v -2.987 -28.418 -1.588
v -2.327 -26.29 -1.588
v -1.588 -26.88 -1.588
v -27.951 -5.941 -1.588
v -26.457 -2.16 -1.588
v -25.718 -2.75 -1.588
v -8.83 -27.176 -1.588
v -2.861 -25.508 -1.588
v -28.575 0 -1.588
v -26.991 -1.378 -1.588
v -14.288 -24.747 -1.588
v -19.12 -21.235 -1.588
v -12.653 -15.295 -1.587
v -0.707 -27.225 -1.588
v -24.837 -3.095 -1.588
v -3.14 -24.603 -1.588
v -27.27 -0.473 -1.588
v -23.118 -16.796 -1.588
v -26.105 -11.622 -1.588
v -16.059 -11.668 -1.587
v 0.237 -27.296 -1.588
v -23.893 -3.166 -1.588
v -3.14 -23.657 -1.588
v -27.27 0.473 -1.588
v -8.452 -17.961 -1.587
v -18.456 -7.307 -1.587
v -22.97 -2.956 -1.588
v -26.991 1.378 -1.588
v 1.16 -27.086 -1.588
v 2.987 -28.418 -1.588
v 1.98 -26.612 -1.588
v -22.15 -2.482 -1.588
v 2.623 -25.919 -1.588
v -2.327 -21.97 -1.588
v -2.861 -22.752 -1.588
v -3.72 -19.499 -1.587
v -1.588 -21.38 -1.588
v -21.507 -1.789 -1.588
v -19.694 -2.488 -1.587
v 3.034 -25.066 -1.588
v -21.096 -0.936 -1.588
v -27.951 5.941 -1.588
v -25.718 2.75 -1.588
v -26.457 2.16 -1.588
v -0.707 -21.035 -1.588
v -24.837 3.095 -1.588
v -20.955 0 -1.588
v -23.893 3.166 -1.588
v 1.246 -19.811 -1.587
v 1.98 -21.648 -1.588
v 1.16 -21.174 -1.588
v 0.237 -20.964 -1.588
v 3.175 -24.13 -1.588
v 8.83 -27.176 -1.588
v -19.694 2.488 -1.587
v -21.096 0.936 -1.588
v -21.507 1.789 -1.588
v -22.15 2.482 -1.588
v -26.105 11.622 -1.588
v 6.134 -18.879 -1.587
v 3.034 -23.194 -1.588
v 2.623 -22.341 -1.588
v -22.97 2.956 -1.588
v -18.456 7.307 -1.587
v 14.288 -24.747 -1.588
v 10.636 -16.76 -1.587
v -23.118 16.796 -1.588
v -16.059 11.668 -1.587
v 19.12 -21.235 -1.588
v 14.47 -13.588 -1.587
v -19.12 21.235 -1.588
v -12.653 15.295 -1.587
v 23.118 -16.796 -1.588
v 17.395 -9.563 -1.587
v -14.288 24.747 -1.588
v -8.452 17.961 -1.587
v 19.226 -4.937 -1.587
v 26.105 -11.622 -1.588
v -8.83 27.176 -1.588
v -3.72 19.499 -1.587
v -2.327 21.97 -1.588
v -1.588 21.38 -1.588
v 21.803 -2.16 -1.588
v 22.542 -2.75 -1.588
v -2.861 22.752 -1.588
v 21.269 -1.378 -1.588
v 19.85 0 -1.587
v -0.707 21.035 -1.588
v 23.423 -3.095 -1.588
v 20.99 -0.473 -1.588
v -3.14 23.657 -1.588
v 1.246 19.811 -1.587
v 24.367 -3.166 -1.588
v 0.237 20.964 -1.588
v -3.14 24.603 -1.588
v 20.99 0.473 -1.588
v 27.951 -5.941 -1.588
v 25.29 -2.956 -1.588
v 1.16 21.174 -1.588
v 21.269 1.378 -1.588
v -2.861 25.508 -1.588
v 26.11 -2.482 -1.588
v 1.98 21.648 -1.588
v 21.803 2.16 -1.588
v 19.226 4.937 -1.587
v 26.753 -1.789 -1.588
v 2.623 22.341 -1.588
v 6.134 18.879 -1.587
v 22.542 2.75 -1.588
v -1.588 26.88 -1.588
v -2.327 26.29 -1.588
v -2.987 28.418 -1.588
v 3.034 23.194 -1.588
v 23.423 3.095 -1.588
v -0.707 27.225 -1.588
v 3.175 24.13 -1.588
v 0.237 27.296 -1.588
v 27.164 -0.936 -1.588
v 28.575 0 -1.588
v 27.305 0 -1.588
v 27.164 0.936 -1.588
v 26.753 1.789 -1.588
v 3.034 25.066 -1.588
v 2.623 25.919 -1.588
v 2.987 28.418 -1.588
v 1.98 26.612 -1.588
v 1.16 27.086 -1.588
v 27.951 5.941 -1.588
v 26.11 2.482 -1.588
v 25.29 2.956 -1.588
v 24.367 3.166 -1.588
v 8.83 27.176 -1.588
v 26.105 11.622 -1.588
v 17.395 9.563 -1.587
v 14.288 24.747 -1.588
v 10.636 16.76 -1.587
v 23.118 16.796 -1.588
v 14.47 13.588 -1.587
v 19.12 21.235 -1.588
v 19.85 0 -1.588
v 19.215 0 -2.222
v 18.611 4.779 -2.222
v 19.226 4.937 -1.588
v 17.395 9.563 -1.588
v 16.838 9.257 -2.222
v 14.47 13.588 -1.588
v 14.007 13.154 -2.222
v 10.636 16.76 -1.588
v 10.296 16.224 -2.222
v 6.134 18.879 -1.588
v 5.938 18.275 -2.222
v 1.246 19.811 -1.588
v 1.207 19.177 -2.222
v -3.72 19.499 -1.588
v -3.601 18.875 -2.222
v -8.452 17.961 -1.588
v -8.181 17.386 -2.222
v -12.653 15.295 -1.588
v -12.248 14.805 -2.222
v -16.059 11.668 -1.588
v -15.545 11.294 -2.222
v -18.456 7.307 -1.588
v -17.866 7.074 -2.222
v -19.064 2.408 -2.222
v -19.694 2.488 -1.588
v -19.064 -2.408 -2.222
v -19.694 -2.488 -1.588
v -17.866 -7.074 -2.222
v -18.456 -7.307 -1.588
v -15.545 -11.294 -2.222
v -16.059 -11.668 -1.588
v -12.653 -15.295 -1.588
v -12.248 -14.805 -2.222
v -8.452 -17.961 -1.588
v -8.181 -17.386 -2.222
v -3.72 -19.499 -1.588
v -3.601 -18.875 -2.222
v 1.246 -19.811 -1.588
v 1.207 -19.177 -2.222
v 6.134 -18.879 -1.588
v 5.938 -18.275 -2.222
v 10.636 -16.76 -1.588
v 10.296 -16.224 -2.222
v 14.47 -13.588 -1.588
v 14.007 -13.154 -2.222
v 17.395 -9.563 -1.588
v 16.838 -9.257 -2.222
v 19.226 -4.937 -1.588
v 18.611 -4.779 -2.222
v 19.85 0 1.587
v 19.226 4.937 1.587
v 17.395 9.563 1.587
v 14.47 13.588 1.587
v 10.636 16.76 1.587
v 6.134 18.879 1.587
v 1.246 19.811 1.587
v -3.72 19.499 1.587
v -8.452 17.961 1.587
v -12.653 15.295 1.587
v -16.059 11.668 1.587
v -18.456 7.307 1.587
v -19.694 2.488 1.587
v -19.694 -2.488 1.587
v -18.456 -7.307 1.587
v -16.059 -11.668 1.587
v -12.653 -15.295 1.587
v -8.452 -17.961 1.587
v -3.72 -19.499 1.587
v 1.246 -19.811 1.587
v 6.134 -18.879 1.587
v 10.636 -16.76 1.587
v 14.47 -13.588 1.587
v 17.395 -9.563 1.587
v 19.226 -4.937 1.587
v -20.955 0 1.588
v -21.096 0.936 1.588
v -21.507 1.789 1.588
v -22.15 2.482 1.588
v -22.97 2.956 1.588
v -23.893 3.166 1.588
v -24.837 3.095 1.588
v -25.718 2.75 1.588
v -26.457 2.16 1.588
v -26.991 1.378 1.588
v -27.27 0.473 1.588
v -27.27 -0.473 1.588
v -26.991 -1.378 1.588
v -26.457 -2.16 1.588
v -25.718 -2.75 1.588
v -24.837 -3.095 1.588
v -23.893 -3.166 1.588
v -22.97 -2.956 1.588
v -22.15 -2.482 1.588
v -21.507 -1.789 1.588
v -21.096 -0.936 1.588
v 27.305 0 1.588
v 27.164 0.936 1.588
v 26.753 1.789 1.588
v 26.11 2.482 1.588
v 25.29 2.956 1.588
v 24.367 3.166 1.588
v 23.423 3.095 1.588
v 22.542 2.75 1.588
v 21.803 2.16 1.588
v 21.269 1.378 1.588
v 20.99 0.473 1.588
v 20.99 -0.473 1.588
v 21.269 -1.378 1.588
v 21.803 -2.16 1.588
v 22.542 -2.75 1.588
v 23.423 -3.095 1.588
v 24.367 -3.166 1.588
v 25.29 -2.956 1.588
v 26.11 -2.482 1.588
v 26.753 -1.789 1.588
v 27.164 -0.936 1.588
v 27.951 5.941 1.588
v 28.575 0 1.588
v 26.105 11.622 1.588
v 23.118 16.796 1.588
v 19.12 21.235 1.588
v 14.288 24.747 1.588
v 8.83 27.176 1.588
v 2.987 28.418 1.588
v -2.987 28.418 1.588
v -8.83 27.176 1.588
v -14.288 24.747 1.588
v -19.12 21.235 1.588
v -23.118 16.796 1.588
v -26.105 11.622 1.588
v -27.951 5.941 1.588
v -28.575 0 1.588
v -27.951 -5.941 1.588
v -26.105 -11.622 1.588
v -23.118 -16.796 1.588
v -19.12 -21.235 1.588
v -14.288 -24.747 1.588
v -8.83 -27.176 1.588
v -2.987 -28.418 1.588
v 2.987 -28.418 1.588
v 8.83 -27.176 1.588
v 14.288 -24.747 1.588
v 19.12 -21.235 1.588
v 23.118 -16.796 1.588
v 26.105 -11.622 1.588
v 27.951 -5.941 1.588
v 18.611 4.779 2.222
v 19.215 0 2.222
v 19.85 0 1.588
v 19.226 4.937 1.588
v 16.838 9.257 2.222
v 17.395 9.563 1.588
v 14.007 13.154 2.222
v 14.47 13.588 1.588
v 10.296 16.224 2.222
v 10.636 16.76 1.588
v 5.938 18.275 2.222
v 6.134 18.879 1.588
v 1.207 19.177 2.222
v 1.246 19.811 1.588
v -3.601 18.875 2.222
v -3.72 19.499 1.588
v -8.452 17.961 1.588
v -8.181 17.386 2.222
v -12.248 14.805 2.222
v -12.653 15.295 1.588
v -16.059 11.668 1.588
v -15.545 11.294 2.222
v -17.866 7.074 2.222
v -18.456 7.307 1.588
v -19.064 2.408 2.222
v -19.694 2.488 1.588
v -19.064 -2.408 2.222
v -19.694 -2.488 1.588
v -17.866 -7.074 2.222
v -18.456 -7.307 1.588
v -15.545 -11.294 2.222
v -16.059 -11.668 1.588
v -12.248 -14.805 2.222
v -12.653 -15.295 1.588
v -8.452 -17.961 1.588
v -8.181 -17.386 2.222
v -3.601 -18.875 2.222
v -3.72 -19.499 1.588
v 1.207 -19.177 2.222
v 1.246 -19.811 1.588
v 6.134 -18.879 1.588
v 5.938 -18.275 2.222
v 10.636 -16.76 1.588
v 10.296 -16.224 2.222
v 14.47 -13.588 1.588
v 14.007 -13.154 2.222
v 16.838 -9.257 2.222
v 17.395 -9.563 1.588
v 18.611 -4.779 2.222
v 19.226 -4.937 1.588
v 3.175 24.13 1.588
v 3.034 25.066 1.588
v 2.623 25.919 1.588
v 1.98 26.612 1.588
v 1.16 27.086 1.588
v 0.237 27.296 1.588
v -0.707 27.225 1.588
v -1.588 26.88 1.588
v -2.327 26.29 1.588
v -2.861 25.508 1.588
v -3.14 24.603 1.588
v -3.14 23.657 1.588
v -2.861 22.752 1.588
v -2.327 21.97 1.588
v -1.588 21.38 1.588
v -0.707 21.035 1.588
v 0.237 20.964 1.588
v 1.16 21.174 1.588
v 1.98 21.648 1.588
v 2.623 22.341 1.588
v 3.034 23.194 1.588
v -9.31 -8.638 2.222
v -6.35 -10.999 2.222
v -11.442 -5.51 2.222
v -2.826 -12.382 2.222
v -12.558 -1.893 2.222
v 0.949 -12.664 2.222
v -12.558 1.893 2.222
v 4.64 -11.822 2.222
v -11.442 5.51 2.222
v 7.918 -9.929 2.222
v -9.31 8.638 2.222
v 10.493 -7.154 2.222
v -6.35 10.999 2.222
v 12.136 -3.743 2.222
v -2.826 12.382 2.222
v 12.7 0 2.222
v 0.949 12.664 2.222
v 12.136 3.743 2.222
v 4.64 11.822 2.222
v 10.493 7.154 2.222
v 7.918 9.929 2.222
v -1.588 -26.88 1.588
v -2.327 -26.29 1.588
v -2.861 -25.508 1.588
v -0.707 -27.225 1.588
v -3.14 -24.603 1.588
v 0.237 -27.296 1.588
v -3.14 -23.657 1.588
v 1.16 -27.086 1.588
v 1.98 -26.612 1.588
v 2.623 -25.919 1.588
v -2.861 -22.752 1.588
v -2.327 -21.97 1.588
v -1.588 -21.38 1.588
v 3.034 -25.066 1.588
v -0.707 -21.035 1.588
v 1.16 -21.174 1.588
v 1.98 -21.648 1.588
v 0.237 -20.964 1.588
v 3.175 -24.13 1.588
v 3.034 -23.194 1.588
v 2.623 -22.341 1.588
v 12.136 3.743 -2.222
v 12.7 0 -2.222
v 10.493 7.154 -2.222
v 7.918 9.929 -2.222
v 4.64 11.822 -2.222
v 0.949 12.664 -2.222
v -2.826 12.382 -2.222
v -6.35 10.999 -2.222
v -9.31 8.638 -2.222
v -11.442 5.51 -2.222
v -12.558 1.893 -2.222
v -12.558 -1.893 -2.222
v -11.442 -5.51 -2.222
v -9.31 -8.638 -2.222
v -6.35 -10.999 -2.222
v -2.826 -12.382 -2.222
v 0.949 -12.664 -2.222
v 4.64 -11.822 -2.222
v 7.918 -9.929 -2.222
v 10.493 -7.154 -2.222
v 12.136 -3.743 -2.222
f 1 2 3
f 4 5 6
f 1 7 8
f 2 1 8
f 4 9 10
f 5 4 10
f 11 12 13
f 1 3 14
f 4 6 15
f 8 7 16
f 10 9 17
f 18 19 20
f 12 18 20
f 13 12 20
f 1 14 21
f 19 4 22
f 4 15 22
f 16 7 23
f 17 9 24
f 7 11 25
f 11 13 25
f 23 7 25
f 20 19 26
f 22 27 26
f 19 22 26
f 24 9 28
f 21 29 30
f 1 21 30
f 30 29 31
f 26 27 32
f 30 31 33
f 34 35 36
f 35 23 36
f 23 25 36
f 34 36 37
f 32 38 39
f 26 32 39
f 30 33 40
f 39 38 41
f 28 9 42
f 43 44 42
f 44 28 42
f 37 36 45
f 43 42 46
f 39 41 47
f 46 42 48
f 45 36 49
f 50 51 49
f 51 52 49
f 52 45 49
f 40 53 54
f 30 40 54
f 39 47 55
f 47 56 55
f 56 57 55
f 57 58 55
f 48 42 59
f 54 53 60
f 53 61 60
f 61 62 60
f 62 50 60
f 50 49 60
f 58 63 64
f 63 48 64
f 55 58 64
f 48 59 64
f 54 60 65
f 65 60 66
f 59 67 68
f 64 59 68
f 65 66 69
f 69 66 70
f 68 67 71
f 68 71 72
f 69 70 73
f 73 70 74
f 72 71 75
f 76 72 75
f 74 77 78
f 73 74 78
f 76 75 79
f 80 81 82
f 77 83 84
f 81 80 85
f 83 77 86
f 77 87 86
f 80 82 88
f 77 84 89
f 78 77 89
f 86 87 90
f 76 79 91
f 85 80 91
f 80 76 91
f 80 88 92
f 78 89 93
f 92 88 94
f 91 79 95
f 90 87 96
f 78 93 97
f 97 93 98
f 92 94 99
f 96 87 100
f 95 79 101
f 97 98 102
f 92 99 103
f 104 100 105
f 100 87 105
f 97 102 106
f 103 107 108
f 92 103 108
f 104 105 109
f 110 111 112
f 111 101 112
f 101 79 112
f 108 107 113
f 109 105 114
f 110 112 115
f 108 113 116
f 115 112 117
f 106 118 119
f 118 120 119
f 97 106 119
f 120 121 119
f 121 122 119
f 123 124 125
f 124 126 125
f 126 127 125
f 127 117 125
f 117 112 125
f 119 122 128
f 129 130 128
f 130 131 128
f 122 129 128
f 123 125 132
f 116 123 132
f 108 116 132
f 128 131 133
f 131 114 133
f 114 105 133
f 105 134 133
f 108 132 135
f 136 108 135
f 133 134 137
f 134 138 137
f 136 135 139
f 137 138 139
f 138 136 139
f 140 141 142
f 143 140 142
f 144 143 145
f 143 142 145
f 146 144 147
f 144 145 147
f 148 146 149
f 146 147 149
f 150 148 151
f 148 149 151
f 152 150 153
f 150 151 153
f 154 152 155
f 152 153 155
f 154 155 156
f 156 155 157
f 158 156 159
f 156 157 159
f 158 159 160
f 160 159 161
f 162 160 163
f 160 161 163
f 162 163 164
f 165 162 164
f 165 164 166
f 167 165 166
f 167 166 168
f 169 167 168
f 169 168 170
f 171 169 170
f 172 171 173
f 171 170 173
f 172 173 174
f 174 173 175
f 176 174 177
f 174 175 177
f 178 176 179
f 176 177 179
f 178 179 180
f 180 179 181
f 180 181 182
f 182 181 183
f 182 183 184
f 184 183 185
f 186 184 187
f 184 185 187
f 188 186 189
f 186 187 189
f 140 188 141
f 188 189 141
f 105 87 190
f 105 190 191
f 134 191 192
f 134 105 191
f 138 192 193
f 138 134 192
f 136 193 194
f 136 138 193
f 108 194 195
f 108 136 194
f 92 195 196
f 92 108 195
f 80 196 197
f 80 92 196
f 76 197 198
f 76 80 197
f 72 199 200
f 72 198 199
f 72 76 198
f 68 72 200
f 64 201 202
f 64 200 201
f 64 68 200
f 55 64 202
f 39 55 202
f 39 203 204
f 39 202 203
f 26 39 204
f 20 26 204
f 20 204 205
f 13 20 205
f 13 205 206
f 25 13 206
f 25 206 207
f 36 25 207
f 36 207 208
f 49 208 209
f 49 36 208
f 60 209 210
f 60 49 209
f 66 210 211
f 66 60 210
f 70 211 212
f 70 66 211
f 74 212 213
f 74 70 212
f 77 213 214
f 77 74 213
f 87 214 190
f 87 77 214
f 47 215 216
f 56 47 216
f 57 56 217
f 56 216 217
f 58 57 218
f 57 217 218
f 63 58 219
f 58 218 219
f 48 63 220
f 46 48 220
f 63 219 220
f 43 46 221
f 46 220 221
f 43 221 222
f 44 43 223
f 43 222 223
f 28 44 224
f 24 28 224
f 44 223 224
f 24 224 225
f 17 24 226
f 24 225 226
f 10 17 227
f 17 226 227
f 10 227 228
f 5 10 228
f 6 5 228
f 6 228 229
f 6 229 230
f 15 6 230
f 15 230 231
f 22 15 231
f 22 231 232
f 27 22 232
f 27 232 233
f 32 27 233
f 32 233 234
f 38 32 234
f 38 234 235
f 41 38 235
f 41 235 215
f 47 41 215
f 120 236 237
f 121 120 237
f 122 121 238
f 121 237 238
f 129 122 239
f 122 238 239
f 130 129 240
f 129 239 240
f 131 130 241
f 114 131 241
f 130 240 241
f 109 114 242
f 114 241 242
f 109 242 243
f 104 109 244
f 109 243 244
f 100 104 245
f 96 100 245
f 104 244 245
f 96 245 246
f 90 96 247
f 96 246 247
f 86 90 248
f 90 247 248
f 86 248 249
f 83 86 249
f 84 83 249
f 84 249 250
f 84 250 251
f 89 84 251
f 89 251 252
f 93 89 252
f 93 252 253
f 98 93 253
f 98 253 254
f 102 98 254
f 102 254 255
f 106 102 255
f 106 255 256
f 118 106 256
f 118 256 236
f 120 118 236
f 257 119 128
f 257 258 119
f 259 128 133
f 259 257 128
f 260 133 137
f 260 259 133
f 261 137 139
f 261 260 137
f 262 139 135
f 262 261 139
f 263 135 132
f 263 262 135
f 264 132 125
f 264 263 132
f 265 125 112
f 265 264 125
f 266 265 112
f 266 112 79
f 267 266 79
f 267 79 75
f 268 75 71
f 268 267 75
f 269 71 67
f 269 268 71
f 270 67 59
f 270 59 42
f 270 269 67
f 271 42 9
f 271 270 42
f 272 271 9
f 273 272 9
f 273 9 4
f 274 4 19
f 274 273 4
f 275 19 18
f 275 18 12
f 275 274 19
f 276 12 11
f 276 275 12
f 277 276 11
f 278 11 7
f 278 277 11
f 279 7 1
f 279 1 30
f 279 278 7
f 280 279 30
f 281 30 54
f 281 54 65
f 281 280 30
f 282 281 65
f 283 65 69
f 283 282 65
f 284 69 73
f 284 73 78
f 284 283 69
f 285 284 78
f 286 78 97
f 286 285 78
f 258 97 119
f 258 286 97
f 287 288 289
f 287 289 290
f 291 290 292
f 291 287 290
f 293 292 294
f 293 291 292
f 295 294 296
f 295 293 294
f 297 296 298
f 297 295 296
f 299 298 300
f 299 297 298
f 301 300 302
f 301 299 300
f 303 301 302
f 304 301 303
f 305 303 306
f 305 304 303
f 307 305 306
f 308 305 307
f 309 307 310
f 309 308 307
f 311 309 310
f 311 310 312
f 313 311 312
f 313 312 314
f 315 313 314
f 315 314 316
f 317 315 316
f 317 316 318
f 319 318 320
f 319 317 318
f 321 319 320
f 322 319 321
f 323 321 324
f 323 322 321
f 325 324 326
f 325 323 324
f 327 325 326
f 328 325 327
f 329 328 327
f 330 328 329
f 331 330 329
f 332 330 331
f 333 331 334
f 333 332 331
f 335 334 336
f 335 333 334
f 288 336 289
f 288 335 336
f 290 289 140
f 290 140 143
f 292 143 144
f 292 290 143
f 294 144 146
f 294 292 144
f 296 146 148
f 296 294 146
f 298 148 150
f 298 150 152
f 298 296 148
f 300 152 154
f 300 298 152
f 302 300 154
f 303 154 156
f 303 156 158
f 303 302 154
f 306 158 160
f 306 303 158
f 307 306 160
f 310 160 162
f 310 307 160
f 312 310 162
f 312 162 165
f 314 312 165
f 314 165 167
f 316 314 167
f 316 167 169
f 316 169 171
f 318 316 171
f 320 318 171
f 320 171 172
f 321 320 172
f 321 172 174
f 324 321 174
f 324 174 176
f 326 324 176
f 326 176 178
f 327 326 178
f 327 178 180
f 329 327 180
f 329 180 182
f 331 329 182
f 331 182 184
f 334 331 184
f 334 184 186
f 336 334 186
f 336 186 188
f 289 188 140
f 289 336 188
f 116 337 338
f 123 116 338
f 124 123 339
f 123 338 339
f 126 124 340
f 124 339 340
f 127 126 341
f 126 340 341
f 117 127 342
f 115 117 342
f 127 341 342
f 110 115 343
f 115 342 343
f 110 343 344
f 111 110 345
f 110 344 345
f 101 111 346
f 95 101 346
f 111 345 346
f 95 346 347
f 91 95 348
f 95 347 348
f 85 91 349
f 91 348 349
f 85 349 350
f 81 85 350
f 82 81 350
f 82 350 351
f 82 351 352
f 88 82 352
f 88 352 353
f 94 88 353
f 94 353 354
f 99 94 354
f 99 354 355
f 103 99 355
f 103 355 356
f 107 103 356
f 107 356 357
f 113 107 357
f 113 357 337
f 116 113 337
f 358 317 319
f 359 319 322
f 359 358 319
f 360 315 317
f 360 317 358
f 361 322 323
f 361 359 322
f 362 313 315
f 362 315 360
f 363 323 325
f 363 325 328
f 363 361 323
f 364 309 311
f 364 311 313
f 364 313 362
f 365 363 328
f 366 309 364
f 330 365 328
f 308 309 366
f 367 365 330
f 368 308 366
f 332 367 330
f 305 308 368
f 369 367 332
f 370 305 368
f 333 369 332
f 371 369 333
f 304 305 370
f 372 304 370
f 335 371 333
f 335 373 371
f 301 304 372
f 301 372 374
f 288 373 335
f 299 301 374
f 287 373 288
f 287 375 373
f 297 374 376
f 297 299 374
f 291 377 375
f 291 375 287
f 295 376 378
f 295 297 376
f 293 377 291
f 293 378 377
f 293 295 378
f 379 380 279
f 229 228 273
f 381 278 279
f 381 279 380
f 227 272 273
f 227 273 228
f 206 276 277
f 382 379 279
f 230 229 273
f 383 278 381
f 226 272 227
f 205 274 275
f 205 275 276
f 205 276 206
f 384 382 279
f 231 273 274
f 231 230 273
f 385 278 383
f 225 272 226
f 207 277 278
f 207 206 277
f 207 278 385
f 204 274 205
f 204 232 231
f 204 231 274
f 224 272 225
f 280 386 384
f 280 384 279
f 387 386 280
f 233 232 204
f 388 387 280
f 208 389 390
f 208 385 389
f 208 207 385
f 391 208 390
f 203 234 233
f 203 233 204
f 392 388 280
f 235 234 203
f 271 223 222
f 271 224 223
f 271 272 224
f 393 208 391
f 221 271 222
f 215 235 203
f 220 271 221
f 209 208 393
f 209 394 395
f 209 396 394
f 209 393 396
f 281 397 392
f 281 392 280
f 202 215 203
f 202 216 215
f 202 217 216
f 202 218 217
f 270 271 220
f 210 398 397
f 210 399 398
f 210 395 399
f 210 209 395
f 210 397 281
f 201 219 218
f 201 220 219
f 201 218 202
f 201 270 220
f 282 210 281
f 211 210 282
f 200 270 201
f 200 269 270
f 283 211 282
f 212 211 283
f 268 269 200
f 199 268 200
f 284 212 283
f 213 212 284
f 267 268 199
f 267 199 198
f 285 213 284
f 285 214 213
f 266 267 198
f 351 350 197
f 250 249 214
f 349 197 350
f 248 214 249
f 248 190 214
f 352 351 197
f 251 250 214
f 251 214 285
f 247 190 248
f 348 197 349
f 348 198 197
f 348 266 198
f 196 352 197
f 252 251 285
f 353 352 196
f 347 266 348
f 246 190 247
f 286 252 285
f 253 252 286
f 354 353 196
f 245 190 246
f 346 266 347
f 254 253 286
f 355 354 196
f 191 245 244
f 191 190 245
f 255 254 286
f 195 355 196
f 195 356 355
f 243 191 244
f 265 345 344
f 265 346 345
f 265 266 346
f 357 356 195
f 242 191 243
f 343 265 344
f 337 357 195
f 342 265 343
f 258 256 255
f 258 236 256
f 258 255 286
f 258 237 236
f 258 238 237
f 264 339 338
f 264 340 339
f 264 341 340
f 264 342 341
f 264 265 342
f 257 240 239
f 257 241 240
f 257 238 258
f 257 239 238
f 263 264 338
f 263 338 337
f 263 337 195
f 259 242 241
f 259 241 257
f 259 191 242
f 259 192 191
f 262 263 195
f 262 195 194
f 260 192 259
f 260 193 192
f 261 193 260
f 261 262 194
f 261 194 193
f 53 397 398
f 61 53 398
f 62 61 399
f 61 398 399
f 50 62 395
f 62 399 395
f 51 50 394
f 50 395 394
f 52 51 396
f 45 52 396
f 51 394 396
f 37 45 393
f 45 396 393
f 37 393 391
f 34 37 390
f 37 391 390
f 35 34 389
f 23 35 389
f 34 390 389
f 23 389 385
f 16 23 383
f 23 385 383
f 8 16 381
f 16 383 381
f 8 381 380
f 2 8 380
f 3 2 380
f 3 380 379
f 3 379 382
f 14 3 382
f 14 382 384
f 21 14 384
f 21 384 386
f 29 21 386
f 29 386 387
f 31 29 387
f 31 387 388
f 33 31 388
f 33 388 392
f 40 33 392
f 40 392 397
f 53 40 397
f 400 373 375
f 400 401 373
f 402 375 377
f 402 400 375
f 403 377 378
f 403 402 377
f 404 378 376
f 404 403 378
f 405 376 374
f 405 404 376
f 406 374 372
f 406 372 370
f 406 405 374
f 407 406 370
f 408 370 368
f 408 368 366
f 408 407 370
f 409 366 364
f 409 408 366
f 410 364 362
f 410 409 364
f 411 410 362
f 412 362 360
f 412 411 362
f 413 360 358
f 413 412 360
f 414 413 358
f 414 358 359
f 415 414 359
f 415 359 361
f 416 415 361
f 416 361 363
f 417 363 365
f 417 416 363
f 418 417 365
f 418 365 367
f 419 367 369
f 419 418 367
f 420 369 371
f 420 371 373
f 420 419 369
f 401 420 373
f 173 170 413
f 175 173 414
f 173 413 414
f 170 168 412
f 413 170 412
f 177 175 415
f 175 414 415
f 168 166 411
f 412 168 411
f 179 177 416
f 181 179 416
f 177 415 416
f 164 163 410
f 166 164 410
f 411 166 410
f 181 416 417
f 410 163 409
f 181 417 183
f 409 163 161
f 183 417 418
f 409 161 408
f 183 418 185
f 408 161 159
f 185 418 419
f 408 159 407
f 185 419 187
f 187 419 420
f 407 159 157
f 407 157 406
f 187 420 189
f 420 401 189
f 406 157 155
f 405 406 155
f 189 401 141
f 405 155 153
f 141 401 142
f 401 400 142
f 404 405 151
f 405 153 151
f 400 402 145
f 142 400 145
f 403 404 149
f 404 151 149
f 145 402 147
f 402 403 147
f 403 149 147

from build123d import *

# Parameters (mm, degrees)
SKETCH1_R               = 28.575
SKETCH1_R_2             = 12.7
BOSS_EXTRUDE1_DEPTH     = 1.5875
SKETCH8_R               = 19.8501
SKETCH8_R_2             = 12.7
BOSS_EXTRUDE2_DEPTH     = 2.2225
CHAMFER1_SIZE           = 0.635
CUT_EXTRUDE1_DEPTH      = 41.472222033
CUT_EXTRUDE1_DEPTH_BACK = 41.472222033
SKETCH9_R               = 19.8501
SKETCH10_R              = 3.175
CUT_EXTRUDE2_DEPTH      = 41.590360309


with BuildPart() as part:
    # Sketch1 → Boss-Extrude1 (new, symmetric)
    with BuildSketch(Plane.XY):
        Circle(SKETCH1_R)
        Circle(SKETCH1_R_2, mode=Mode.SUBTRACT)
    extrude(amount=BOSS_EXTRUDE1_DEPTH, both=True)

    # Sketch9 → Cut-Extrude1 (cut, two sides: drawn at the far end of the back side and taken through both)
    with BuildSketch(Plane.XY.offset(-CUT_EXTRUDE1_DEPTH_BACK)):
        Circle(SKETCH9_R)
    extrude(amount=CUT_EXTRUDE1_DEPTH + CUT_EXTRUDE1_DEPTH_BACK, mode=Mode.SUBTRACT)

    # Sketch10 → Cut-Extrude2 (cut, through all)
    with BuildSketch(Plane.XY.offset(1.5875)):
        with Locations((0, 24.13)):
            Circle(SKETCH10_R)
        with Locations((24.13, 0)):
            Circle(SKETCH10_R)
        with Locations((0, -24.13)):
            Circle(SKETCH10_R)
        with Locations((-24.13, 0)):
            Circle(SKETCH10_R)
    extrude(amount=-CUT_EXTRUDE2_DEPTH, mode=Mode.SUBTRACT)


with BuildPart() as body_2:
    # Sketch8 → Boss-Extrude2 (new, symmetric)
    with BuildSketch(Plane.XY):
        Circle(SKETCH8_R)
        Circle(SKETCH8_R_2, mode=Mode.SUBTRACT)
    extrude(amount=BOSS_EXTRUDE2_DEPTH, both=True)

    # Chamfer1
    chamfer1_edges = [body_2.edges().sort_by_distance(p)[0] for p in [
        (-19.8501, 0, -2.2225),
        (-19.8501, 0, 2.2225),
    ]]
    chamfer(chamfer1_edges, length=CHAMFER1_SIZE)


solid = Compound([part.part, body_2.part])
